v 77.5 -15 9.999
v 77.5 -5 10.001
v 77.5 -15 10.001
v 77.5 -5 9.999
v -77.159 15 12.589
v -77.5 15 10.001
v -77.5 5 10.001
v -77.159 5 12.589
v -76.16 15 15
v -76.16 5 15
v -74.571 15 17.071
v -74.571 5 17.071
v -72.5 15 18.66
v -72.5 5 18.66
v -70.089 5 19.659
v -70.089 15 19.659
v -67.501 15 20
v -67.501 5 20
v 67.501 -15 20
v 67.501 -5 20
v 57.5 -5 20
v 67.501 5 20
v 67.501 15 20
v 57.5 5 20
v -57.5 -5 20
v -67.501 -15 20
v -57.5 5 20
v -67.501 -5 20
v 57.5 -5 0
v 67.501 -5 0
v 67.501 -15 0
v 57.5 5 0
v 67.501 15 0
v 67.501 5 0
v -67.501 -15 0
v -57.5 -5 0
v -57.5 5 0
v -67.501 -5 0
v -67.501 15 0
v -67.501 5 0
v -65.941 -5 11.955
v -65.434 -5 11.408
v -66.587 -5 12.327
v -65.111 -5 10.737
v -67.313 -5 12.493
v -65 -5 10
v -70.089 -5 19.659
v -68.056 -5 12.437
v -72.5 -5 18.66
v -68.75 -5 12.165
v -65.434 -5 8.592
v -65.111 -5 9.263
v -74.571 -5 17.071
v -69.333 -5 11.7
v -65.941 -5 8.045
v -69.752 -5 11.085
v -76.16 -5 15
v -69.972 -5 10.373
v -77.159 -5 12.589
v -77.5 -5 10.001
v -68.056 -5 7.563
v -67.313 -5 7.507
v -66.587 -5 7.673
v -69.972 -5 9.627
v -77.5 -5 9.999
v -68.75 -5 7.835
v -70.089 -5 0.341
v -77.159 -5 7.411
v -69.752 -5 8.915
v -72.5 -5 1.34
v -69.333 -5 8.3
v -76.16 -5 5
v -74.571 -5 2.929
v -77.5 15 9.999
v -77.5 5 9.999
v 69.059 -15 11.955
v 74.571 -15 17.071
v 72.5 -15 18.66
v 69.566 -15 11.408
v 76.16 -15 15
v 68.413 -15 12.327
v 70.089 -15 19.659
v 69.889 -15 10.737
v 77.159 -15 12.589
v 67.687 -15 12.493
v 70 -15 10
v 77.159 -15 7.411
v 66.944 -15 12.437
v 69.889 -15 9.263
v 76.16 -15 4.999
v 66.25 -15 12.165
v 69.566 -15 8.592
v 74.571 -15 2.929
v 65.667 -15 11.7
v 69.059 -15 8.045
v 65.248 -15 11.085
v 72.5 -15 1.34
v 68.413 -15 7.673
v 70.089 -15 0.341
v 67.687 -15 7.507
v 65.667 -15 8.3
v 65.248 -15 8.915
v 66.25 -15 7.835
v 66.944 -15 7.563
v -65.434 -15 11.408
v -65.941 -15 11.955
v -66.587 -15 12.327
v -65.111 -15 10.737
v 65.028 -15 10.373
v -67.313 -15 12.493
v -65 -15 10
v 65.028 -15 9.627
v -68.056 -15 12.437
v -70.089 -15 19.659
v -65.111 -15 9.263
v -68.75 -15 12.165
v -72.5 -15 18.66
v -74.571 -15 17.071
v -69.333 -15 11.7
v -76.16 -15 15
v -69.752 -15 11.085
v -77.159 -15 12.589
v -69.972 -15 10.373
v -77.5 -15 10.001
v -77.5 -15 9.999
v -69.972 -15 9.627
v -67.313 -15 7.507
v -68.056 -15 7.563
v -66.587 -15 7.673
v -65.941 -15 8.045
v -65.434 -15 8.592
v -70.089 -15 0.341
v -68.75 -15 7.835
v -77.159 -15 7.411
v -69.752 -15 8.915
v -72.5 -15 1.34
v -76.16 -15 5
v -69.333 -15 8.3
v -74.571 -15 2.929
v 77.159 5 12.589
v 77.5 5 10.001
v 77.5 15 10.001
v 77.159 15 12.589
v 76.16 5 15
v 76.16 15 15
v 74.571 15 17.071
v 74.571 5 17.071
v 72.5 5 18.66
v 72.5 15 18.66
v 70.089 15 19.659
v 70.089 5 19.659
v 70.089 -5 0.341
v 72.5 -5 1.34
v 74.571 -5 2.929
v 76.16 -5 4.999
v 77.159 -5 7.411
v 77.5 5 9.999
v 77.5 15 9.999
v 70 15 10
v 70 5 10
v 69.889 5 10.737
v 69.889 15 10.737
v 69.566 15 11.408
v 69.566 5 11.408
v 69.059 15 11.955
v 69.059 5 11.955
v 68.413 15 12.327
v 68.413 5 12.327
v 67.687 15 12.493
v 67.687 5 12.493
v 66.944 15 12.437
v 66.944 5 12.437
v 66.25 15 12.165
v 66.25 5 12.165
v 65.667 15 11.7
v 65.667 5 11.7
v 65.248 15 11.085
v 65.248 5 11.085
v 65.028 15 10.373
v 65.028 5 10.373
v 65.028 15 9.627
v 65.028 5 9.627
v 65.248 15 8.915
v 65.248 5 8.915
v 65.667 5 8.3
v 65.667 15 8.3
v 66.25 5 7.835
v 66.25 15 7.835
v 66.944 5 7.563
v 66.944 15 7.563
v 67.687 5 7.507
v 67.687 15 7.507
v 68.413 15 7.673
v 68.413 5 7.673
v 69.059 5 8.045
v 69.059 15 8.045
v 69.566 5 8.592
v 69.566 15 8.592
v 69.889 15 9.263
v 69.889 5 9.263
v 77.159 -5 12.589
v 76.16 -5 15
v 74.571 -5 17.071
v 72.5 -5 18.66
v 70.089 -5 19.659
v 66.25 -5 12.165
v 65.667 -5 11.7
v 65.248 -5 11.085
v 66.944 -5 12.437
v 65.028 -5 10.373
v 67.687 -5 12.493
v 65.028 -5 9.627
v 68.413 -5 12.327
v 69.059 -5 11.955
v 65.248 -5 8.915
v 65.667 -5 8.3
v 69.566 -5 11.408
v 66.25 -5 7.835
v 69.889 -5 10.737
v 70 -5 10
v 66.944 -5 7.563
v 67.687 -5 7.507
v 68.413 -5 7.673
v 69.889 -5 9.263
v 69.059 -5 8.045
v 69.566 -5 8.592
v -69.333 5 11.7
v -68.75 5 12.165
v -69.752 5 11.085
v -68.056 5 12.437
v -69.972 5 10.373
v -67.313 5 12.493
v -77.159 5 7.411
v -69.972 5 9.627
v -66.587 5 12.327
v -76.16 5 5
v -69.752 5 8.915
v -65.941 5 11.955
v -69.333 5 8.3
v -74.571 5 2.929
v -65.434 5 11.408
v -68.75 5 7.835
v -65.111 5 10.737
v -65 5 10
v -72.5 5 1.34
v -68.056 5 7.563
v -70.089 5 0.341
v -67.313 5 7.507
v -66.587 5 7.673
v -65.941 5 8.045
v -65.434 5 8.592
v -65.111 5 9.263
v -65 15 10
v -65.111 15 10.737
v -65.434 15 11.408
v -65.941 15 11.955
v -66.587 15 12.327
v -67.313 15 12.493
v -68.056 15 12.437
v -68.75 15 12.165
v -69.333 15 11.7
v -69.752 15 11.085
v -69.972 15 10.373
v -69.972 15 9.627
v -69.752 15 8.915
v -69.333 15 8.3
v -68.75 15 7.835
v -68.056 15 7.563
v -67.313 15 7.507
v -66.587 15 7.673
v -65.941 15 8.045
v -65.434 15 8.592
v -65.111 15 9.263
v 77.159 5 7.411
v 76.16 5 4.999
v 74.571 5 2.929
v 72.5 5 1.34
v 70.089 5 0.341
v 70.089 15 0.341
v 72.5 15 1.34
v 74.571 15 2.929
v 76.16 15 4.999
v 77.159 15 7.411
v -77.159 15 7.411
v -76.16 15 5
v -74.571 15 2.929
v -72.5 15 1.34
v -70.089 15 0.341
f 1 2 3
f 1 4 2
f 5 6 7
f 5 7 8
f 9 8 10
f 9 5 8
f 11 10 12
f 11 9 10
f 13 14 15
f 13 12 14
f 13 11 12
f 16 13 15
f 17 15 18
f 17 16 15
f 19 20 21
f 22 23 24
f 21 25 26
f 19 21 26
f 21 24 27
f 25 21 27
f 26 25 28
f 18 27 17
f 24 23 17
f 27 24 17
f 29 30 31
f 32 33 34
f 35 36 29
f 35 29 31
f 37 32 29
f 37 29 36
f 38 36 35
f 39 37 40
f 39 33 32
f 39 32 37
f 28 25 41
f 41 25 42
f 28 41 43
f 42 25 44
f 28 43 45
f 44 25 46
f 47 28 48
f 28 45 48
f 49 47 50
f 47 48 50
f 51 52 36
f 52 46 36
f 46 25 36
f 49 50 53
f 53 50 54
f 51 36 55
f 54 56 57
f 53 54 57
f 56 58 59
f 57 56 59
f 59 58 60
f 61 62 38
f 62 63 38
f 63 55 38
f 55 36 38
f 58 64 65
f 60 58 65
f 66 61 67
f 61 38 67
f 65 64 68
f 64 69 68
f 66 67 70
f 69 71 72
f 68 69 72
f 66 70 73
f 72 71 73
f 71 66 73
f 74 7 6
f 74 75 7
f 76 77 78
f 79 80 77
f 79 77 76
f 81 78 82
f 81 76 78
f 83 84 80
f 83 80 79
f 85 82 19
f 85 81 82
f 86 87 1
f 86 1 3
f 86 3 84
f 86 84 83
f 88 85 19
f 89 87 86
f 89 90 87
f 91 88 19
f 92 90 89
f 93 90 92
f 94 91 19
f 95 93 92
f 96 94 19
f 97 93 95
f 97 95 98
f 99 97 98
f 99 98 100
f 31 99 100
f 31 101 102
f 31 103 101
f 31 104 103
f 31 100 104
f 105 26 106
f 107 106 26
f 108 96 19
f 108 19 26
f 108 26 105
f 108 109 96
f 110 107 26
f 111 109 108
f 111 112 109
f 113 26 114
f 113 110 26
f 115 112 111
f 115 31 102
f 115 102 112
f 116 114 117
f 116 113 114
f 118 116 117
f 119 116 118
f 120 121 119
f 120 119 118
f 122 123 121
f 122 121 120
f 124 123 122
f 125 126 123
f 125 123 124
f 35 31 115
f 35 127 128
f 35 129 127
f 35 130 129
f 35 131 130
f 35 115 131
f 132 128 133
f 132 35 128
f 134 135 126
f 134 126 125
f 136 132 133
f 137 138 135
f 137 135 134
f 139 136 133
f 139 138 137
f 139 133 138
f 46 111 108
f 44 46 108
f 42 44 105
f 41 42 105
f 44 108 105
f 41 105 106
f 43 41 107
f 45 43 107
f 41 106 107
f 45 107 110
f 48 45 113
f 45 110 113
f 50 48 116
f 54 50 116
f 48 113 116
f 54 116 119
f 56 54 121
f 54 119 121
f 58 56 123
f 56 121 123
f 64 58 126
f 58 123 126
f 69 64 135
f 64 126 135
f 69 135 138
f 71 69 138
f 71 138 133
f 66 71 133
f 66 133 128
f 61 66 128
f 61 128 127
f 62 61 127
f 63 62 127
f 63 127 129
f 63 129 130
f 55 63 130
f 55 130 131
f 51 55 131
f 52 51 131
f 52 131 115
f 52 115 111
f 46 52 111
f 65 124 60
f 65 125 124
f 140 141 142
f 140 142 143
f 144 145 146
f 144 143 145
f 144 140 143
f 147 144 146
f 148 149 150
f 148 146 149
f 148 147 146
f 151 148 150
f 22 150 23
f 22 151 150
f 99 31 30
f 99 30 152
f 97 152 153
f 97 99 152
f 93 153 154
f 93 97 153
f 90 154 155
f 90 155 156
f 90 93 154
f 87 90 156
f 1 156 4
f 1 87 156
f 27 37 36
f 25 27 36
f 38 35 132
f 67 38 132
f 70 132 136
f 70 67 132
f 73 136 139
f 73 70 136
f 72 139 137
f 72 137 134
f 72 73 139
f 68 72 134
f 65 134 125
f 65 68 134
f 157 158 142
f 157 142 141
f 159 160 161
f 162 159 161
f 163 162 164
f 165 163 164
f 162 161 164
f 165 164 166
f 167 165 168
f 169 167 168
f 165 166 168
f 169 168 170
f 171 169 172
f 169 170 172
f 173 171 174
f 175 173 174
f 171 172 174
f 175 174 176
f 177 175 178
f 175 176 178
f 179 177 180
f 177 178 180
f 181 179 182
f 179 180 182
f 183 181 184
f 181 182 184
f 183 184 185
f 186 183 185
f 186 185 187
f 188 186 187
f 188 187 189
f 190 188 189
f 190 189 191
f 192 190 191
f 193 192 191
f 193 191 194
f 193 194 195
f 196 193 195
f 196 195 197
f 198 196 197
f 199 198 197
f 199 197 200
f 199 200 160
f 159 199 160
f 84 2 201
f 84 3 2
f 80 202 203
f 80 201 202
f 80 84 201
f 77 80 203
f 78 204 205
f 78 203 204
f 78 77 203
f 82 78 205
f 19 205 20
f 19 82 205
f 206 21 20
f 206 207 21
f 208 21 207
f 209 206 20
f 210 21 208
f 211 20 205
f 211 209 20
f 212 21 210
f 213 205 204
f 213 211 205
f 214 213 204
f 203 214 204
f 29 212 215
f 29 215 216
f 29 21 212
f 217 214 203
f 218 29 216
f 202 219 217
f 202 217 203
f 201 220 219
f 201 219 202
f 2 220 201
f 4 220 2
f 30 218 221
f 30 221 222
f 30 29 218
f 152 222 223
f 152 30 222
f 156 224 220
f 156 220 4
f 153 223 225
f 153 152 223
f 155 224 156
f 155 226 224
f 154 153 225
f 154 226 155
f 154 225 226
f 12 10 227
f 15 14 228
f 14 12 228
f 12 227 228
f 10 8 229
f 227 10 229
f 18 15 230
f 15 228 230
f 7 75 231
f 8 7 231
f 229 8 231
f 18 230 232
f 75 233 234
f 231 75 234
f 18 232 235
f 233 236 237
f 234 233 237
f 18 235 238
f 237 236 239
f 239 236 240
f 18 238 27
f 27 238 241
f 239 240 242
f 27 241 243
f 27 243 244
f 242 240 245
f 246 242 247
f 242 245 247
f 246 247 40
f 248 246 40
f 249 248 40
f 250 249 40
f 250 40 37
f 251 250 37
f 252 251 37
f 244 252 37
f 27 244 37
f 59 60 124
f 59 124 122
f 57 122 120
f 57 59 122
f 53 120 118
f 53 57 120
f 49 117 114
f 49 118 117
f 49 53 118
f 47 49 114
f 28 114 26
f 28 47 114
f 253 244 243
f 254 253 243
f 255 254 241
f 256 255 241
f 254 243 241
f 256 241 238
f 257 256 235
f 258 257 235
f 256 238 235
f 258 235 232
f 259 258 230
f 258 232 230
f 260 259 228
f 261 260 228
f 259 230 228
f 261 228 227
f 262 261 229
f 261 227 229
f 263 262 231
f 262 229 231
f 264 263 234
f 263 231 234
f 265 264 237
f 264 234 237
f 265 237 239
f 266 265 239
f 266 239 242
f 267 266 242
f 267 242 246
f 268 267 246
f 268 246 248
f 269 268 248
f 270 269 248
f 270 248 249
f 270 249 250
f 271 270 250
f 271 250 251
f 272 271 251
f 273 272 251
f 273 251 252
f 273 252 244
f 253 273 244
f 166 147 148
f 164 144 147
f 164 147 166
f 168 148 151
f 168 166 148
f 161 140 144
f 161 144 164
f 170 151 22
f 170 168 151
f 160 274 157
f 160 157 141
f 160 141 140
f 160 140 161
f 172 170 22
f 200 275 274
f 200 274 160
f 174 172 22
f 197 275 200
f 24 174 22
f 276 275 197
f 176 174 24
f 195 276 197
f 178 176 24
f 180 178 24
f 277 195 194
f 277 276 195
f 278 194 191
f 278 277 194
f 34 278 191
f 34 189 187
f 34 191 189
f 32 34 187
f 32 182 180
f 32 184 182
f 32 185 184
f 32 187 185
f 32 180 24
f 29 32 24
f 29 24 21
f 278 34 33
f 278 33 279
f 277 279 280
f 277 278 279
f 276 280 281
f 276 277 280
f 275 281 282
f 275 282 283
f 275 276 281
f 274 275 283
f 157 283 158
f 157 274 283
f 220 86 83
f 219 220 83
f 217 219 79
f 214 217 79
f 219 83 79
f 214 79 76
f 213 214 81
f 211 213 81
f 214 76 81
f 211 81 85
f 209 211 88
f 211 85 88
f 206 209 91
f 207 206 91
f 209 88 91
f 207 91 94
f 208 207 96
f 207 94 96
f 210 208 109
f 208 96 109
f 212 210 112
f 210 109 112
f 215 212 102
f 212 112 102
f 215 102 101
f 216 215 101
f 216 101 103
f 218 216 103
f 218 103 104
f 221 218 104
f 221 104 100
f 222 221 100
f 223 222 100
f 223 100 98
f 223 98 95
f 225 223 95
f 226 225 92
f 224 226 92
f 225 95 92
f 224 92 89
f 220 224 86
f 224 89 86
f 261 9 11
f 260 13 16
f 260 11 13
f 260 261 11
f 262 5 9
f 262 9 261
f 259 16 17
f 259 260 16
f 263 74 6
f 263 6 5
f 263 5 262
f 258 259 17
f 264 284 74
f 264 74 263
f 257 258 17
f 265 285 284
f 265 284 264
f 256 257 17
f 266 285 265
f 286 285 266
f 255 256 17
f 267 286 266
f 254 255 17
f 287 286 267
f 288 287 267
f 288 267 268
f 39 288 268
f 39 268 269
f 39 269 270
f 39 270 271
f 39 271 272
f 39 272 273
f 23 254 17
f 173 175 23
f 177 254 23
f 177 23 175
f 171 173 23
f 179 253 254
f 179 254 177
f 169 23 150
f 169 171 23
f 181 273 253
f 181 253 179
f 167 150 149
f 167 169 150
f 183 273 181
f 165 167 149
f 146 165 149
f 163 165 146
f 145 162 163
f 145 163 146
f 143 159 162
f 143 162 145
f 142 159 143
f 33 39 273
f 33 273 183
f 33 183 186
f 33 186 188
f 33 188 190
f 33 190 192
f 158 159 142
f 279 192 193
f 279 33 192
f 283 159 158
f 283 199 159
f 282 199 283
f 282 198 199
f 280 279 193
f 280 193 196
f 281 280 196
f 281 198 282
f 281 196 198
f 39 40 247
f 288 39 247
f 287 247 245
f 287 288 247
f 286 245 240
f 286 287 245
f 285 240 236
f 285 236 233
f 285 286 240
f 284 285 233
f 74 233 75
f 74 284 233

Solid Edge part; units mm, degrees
sketch "Sketch1" plane through (0, 0, 0) normal (0, 0, 1) x (1, 0, 0)
  line L0 (57.5, -5) -> (77.5, -5)
  line L1 (77.5, -5) -> (77.5, -15)
  line L2 (77.5, -15) -> (-77.5, -15)
  line L3 (-77.5, -15) -> (-77.5, -5)
  line L4 (-57.5, -5) -> (-77.5, -5)
  line L5 (-57.5, 5) -> (-57.5, -5)
  line L6 (-77.5, 5) -> (-57.5, 5)
  line L7 (-77.5, 5) -> (-77.5, 15)
  line L8 (-77.5, 15) -> (77.5, 15)
  line L9 (77.5, 15) -> (77.5, 5)
  line L10 (77.5, 5) -> (57.5, 5)
  line L11 (57.5, 5) -> (57.5, -5)
extrude "Protrusion1" add sketch "Sketch1" along normal blind 20
sketch "Sketch2" plane through (0, -15, 10) normal (0, -1, 0) x (1, 0, 0)
  circle A0 centre (67.5, 0) radius 2.5
  circle A1 centre (-67.5, 0) radius 2.5
  dimension "D1" = 5
  dimension "D2" = 10
  dimension "D3" = 10
extrude "Cutout1" cut sketch "Sketch2" against normal up to surface (30 mm away)
fillet "Redondeo_1" radius 10 8 edges at (77.5, -10, 20) (77.5, 10, 20) (77.5, -10, 0) (77.5, 10, 0) (-77.5, 10, 20) (-77.5, -10, 20) (-77.5, -10, 0) (-77.5, 10, 0)
